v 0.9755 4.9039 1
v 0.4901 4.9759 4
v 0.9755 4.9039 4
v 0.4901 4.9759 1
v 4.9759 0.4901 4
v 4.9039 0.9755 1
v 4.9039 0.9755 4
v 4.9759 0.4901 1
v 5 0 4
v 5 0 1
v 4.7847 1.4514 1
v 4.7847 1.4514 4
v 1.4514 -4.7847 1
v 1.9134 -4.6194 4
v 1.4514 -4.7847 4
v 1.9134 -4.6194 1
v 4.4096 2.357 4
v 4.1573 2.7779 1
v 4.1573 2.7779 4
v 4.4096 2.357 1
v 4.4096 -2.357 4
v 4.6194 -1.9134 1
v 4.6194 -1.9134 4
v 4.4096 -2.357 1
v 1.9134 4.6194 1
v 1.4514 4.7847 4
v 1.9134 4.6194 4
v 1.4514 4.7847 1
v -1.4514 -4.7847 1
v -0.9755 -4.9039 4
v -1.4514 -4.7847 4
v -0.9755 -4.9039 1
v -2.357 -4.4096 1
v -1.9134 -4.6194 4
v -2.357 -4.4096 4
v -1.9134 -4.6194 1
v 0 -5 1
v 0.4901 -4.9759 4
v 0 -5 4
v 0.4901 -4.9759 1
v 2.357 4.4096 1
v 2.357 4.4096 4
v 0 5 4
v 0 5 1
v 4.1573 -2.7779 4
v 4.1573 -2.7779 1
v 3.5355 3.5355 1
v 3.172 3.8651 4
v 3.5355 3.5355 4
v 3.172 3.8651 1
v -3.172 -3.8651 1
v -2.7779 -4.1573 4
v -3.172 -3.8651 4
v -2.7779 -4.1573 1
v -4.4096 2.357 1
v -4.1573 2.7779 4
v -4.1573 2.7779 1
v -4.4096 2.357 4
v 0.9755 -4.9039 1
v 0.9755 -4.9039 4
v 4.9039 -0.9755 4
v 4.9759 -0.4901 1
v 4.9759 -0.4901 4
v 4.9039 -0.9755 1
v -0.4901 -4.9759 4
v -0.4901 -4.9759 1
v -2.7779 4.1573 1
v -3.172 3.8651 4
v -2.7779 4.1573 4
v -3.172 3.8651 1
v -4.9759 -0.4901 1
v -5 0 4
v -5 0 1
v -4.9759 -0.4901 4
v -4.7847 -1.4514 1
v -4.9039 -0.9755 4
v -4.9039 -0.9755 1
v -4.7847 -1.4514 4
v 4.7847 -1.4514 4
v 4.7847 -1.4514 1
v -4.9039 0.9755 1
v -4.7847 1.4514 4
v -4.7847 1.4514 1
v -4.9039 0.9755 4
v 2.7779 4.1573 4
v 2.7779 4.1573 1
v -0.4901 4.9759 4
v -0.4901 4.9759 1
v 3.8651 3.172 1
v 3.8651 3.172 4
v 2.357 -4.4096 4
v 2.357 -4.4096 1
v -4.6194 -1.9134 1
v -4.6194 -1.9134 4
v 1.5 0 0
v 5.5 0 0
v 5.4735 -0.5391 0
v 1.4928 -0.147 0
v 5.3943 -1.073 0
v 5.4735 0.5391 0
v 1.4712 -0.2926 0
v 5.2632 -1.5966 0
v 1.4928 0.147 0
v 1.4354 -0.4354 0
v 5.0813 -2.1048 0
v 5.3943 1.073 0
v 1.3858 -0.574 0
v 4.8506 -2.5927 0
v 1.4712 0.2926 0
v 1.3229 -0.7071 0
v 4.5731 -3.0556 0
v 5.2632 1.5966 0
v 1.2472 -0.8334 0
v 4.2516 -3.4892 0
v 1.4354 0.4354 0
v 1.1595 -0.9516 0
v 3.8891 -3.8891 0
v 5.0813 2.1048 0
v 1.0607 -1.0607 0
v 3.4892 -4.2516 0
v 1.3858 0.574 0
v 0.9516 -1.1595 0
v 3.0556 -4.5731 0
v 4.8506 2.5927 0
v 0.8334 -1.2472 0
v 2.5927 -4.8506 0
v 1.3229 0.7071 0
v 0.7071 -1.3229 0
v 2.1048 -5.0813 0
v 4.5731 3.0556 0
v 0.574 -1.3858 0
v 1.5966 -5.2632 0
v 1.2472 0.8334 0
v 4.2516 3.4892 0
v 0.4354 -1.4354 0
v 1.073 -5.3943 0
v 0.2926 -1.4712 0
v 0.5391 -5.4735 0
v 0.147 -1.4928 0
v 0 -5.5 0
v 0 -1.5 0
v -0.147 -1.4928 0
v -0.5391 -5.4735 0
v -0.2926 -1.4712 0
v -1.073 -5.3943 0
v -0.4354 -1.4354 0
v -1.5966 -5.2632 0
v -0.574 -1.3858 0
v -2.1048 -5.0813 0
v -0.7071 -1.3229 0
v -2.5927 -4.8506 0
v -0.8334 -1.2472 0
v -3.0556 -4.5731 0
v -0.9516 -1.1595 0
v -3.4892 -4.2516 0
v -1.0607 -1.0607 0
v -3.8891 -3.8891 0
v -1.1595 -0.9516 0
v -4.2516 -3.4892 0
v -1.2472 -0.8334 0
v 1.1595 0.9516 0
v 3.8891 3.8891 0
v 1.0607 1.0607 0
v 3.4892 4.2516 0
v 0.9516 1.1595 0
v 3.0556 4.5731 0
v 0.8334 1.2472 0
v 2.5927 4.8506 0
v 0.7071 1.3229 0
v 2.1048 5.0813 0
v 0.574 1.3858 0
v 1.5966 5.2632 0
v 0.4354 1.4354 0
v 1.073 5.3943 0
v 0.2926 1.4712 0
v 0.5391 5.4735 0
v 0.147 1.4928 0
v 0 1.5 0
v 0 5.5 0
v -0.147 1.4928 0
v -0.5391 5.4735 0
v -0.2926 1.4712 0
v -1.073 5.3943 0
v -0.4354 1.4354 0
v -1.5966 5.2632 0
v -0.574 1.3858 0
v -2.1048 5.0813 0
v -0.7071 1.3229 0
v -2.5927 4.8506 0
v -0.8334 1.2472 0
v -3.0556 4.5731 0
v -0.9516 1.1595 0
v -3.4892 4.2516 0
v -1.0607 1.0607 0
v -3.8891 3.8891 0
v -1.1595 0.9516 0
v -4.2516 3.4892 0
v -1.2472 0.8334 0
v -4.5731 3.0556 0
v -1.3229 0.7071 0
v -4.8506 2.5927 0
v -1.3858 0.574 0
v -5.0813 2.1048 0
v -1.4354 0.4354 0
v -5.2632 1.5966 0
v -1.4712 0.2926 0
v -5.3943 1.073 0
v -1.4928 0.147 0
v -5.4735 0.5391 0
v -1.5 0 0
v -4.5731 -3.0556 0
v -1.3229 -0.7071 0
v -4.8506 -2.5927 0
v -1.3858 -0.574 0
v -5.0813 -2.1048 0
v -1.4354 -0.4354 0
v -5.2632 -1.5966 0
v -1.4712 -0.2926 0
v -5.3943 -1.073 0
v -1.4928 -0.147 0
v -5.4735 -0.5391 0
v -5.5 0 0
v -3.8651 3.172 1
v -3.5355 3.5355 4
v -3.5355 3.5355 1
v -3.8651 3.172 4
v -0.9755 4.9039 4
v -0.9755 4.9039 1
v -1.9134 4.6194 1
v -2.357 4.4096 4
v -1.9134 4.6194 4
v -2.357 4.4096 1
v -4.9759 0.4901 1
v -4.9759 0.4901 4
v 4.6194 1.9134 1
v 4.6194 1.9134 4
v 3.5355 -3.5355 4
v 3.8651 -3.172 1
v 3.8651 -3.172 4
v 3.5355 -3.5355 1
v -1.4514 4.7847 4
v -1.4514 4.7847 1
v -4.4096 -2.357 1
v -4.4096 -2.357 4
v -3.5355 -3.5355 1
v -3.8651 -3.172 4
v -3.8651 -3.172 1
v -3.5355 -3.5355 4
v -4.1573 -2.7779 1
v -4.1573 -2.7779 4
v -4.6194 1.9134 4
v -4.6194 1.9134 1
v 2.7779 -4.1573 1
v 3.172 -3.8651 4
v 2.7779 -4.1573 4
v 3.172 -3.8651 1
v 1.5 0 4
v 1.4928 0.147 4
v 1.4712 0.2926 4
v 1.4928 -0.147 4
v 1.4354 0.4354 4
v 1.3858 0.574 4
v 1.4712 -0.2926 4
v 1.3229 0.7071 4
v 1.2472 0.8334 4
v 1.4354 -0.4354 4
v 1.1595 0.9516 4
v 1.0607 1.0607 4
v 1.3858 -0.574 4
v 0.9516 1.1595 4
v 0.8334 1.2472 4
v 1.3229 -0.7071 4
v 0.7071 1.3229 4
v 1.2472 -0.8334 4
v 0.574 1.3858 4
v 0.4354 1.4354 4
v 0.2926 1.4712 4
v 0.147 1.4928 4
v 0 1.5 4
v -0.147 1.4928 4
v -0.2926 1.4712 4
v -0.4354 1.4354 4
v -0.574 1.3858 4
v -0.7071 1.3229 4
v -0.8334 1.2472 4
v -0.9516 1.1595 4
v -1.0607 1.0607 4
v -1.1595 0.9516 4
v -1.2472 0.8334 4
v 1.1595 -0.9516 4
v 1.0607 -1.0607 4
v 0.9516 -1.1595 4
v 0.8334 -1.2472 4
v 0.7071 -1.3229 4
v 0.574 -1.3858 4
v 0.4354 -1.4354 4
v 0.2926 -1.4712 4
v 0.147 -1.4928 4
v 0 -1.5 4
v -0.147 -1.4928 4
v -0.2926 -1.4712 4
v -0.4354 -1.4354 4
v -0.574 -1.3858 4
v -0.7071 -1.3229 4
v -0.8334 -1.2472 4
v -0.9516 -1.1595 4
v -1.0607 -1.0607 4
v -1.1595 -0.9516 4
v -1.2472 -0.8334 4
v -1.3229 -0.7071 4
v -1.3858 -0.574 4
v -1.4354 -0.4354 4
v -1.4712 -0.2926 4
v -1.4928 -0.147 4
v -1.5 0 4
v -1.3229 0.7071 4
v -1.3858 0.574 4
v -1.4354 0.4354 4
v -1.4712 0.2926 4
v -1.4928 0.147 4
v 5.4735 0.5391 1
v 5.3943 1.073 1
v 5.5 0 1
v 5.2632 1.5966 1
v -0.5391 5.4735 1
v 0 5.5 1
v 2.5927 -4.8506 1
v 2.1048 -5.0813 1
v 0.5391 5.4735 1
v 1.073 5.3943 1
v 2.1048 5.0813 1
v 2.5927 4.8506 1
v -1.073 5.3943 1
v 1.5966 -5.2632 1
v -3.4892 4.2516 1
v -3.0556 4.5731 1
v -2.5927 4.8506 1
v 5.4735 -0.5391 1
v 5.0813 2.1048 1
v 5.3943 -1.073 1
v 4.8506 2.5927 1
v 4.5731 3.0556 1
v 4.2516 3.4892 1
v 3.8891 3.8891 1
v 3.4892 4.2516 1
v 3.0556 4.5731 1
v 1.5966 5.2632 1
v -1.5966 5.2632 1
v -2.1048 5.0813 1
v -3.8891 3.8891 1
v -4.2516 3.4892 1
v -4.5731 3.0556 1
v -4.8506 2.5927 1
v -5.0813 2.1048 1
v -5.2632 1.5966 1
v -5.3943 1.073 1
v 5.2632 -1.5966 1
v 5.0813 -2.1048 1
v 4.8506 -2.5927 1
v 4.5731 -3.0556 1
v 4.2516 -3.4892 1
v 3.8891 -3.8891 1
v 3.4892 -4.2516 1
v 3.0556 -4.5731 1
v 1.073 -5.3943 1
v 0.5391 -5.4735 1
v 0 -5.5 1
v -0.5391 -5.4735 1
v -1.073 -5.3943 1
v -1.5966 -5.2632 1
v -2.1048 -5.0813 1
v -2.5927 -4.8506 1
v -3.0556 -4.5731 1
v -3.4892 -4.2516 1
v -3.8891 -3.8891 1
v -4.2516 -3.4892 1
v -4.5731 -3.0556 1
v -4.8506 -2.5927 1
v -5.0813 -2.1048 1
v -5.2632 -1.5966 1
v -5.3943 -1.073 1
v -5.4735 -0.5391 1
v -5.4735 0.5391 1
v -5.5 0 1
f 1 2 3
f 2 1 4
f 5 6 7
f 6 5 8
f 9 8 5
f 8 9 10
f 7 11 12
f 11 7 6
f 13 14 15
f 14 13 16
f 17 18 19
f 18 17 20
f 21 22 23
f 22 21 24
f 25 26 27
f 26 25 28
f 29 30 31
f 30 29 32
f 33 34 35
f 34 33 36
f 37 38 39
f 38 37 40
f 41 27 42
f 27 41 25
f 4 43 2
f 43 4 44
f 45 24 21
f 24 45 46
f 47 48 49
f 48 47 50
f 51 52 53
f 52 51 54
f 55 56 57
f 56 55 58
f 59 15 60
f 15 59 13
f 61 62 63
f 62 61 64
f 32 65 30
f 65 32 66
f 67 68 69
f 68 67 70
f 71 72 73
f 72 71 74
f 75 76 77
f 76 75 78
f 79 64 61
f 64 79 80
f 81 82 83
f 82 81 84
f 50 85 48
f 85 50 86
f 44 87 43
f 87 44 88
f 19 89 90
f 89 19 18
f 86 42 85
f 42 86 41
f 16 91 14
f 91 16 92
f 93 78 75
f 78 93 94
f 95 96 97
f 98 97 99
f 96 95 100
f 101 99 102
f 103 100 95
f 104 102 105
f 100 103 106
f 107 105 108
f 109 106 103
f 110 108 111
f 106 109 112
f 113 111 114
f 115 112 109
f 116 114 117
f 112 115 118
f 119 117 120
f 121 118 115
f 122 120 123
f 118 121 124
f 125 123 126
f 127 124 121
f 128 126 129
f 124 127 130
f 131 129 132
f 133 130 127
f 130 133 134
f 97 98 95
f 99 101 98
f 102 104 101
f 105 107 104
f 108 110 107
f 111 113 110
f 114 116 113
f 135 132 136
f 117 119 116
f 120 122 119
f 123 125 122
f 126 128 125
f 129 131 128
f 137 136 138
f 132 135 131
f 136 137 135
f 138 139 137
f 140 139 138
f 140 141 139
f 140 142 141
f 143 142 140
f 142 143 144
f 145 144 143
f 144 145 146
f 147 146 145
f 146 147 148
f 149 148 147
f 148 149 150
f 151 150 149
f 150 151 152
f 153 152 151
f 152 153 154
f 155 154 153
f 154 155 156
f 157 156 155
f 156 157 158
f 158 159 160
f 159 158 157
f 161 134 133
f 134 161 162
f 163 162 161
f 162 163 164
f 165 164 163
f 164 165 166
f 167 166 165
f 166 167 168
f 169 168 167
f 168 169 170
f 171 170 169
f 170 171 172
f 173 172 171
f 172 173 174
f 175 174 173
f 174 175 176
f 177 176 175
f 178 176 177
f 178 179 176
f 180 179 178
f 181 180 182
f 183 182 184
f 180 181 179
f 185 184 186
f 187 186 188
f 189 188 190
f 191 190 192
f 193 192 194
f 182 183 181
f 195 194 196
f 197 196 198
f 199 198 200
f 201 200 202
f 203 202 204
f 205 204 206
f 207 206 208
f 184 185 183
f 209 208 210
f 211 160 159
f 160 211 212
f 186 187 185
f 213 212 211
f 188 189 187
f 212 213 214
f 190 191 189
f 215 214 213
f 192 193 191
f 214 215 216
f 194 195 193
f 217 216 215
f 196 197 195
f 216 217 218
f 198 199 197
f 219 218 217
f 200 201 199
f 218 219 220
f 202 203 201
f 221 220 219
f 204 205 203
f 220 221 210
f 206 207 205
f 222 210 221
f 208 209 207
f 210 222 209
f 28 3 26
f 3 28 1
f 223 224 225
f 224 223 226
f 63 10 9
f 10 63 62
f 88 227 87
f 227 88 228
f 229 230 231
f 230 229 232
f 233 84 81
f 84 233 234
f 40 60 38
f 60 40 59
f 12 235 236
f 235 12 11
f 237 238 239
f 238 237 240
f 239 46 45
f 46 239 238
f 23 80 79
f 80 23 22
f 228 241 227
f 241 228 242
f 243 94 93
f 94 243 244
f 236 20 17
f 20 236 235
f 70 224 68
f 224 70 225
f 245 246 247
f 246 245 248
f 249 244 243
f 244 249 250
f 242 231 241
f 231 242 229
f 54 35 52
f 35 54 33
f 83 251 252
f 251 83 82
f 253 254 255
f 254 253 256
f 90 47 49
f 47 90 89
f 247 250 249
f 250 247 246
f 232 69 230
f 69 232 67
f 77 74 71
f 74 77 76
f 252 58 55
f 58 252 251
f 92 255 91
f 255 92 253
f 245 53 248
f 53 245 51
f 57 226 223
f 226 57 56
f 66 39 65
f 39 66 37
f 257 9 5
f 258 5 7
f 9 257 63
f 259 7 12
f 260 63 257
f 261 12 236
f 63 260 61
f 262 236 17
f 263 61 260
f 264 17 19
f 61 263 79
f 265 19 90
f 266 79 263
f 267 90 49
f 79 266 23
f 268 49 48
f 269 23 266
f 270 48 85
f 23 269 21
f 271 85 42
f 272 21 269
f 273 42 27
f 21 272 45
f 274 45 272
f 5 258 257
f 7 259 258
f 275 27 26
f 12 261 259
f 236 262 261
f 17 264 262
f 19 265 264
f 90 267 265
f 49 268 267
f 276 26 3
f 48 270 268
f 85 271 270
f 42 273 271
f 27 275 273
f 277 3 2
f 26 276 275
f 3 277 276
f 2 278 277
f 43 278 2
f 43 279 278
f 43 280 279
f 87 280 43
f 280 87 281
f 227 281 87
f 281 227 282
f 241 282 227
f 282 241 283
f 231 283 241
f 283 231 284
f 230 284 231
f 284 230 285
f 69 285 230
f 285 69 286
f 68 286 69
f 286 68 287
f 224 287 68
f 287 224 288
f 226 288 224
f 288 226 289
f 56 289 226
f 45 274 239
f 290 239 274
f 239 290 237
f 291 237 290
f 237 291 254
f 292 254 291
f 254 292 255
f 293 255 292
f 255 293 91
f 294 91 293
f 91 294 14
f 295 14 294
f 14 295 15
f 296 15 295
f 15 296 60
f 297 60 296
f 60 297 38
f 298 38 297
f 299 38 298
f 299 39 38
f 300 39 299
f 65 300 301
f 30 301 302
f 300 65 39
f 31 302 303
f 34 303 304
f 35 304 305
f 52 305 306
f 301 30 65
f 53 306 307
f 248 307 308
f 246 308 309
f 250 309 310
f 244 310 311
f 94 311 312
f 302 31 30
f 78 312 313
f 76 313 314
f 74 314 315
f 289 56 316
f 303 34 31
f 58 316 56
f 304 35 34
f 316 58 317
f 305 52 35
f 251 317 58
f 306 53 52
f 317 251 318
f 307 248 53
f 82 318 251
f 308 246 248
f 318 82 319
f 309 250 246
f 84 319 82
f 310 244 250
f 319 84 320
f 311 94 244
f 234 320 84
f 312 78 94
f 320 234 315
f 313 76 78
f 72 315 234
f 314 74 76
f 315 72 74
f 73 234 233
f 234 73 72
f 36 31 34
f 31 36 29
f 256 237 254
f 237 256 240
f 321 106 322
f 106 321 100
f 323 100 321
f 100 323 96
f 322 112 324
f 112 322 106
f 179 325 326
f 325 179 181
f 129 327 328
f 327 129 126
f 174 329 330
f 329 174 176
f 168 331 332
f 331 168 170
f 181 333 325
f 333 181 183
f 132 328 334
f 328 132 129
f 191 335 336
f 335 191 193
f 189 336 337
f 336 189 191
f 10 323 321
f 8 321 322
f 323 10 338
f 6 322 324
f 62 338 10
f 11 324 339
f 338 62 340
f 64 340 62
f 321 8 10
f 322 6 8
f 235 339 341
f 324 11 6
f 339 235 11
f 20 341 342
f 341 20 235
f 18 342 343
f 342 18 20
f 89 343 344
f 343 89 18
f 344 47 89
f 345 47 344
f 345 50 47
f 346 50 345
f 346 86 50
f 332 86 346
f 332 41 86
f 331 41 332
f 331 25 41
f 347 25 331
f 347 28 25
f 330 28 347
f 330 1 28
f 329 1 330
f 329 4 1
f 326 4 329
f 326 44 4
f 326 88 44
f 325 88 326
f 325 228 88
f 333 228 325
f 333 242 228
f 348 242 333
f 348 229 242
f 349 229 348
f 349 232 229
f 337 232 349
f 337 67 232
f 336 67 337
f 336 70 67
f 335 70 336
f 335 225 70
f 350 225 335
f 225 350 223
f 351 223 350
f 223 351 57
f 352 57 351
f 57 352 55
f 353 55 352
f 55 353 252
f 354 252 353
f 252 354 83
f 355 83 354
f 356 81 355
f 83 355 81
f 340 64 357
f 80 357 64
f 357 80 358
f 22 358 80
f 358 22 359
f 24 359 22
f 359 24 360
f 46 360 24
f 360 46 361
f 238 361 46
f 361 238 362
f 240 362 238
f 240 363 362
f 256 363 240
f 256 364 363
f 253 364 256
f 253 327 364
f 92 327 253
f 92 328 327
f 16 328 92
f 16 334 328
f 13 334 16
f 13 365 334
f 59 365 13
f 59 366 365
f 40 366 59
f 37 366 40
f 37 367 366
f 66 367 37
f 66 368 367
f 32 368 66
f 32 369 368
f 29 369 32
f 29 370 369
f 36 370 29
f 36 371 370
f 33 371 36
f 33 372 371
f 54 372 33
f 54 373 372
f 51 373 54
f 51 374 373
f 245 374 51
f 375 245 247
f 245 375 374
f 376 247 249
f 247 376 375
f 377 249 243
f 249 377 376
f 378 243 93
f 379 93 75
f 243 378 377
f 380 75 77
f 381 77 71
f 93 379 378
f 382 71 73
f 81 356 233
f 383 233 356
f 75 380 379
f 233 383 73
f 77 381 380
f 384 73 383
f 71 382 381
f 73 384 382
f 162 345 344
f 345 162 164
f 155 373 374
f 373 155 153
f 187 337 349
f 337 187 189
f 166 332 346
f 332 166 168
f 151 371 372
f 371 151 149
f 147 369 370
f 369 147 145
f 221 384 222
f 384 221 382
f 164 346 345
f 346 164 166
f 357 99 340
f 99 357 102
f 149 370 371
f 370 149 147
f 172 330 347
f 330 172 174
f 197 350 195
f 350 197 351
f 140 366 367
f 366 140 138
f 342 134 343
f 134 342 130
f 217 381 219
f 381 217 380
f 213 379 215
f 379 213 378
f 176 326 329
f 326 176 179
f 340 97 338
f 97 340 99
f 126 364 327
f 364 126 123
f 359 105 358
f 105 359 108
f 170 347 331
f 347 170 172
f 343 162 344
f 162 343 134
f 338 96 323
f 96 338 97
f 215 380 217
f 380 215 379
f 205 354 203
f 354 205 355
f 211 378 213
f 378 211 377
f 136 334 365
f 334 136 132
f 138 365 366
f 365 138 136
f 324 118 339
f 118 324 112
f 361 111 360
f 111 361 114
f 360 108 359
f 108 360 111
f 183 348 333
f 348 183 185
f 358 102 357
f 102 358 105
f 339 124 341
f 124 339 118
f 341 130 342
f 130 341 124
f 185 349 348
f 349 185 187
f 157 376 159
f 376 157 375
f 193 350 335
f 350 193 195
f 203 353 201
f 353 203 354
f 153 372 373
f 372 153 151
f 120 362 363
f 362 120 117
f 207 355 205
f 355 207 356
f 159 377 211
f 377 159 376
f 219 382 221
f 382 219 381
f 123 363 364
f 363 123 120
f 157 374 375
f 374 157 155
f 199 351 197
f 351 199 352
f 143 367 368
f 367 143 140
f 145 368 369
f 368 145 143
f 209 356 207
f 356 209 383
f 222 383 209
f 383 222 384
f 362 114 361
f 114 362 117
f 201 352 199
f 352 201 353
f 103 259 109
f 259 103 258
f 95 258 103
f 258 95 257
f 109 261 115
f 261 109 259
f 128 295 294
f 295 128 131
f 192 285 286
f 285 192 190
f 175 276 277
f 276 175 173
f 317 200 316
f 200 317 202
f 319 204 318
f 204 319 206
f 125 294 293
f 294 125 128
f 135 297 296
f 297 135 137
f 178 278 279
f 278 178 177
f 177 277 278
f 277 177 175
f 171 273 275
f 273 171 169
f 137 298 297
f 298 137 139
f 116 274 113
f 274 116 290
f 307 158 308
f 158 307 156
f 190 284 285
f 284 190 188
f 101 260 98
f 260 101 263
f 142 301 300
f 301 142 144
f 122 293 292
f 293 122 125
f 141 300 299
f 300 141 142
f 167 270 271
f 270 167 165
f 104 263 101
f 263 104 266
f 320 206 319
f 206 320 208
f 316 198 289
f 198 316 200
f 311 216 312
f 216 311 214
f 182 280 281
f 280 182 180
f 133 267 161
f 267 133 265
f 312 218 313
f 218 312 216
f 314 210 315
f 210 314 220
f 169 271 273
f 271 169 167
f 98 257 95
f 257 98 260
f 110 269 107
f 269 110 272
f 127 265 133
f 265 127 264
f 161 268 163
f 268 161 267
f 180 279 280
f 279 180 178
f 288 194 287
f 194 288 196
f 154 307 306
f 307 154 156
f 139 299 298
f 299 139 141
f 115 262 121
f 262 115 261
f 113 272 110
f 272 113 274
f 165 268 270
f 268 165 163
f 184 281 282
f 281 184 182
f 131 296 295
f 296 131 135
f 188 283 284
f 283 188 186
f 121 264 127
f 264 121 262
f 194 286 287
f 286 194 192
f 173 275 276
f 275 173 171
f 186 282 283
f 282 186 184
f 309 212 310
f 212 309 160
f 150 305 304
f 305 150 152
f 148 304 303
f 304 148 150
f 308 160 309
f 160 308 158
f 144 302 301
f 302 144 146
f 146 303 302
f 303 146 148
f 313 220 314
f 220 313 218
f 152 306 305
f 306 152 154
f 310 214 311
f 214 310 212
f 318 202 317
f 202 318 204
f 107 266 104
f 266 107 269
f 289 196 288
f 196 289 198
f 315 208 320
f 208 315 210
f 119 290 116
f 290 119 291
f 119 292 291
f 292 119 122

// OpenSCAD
$fn = 64;

//bearing(type = "623");
bearing(type = "F623");
//MF63: 3x6x2.5(0.6), MF 63 ZZ ()
//MR63: 3x6x2.5, MR 63 ZZ
//bearing_base(base = [10, 3, 4]);
//bearing_base(base = [10, 3, 4], flansh = [11, 1]);
        
module bearing_outline(type, extra = 0) {
    if(type == "623")
        bearing_base_outline(base = [10, 3, 4], extra = extra);
    if(type == "F623")
        bearing_base_outline(base = [10, 3, 4], flansh = [11, 1], extra = extra);
    if(type == "MF63")
        bearing_base_outline(base = [6, 3, 2.5], flansh = [6.2, 0.6], extra = extra);
    if(type == "MR63")
        bearing_base_outline(base = [6, 3, 2.5], extra = extra);
}

module bearing(type) {
    if(type == "623")
        bearing_base(base = [10, 3, 4]);
    if(type == "F623")
        bearing_base(base = [10, 3, 4], flansh = [11, 1]);
    if(type == "MF63")
        bearing_base(base = [6, 3, 2.5], flansh = [6.2, 0.6]);
    if(type == "MR63")
        bearing_base(base = [6, 3, 2.5]);
}

// base[od, id, h]
// flansh[od, h]
module bearing_base_outline(base, flansh = [0, 0], extra = 0) {
    cylinder(d = base[0]+extra, h = base[2]+extra);
    if(flansh[0] != 0) cylinder(d = flansh[0]+extra, h = flansh[2]+extra);
}

// base[od, id, h]
// flansh[od, h]
module bearing_base(base, flansh = [0, 0]) {
    difference() {
        bearing_base_outline(base = base, flansh = flansh, extra = 0);
        cylinder(d = base[1], h = base[2]*2+1, center = true);
    }
}
